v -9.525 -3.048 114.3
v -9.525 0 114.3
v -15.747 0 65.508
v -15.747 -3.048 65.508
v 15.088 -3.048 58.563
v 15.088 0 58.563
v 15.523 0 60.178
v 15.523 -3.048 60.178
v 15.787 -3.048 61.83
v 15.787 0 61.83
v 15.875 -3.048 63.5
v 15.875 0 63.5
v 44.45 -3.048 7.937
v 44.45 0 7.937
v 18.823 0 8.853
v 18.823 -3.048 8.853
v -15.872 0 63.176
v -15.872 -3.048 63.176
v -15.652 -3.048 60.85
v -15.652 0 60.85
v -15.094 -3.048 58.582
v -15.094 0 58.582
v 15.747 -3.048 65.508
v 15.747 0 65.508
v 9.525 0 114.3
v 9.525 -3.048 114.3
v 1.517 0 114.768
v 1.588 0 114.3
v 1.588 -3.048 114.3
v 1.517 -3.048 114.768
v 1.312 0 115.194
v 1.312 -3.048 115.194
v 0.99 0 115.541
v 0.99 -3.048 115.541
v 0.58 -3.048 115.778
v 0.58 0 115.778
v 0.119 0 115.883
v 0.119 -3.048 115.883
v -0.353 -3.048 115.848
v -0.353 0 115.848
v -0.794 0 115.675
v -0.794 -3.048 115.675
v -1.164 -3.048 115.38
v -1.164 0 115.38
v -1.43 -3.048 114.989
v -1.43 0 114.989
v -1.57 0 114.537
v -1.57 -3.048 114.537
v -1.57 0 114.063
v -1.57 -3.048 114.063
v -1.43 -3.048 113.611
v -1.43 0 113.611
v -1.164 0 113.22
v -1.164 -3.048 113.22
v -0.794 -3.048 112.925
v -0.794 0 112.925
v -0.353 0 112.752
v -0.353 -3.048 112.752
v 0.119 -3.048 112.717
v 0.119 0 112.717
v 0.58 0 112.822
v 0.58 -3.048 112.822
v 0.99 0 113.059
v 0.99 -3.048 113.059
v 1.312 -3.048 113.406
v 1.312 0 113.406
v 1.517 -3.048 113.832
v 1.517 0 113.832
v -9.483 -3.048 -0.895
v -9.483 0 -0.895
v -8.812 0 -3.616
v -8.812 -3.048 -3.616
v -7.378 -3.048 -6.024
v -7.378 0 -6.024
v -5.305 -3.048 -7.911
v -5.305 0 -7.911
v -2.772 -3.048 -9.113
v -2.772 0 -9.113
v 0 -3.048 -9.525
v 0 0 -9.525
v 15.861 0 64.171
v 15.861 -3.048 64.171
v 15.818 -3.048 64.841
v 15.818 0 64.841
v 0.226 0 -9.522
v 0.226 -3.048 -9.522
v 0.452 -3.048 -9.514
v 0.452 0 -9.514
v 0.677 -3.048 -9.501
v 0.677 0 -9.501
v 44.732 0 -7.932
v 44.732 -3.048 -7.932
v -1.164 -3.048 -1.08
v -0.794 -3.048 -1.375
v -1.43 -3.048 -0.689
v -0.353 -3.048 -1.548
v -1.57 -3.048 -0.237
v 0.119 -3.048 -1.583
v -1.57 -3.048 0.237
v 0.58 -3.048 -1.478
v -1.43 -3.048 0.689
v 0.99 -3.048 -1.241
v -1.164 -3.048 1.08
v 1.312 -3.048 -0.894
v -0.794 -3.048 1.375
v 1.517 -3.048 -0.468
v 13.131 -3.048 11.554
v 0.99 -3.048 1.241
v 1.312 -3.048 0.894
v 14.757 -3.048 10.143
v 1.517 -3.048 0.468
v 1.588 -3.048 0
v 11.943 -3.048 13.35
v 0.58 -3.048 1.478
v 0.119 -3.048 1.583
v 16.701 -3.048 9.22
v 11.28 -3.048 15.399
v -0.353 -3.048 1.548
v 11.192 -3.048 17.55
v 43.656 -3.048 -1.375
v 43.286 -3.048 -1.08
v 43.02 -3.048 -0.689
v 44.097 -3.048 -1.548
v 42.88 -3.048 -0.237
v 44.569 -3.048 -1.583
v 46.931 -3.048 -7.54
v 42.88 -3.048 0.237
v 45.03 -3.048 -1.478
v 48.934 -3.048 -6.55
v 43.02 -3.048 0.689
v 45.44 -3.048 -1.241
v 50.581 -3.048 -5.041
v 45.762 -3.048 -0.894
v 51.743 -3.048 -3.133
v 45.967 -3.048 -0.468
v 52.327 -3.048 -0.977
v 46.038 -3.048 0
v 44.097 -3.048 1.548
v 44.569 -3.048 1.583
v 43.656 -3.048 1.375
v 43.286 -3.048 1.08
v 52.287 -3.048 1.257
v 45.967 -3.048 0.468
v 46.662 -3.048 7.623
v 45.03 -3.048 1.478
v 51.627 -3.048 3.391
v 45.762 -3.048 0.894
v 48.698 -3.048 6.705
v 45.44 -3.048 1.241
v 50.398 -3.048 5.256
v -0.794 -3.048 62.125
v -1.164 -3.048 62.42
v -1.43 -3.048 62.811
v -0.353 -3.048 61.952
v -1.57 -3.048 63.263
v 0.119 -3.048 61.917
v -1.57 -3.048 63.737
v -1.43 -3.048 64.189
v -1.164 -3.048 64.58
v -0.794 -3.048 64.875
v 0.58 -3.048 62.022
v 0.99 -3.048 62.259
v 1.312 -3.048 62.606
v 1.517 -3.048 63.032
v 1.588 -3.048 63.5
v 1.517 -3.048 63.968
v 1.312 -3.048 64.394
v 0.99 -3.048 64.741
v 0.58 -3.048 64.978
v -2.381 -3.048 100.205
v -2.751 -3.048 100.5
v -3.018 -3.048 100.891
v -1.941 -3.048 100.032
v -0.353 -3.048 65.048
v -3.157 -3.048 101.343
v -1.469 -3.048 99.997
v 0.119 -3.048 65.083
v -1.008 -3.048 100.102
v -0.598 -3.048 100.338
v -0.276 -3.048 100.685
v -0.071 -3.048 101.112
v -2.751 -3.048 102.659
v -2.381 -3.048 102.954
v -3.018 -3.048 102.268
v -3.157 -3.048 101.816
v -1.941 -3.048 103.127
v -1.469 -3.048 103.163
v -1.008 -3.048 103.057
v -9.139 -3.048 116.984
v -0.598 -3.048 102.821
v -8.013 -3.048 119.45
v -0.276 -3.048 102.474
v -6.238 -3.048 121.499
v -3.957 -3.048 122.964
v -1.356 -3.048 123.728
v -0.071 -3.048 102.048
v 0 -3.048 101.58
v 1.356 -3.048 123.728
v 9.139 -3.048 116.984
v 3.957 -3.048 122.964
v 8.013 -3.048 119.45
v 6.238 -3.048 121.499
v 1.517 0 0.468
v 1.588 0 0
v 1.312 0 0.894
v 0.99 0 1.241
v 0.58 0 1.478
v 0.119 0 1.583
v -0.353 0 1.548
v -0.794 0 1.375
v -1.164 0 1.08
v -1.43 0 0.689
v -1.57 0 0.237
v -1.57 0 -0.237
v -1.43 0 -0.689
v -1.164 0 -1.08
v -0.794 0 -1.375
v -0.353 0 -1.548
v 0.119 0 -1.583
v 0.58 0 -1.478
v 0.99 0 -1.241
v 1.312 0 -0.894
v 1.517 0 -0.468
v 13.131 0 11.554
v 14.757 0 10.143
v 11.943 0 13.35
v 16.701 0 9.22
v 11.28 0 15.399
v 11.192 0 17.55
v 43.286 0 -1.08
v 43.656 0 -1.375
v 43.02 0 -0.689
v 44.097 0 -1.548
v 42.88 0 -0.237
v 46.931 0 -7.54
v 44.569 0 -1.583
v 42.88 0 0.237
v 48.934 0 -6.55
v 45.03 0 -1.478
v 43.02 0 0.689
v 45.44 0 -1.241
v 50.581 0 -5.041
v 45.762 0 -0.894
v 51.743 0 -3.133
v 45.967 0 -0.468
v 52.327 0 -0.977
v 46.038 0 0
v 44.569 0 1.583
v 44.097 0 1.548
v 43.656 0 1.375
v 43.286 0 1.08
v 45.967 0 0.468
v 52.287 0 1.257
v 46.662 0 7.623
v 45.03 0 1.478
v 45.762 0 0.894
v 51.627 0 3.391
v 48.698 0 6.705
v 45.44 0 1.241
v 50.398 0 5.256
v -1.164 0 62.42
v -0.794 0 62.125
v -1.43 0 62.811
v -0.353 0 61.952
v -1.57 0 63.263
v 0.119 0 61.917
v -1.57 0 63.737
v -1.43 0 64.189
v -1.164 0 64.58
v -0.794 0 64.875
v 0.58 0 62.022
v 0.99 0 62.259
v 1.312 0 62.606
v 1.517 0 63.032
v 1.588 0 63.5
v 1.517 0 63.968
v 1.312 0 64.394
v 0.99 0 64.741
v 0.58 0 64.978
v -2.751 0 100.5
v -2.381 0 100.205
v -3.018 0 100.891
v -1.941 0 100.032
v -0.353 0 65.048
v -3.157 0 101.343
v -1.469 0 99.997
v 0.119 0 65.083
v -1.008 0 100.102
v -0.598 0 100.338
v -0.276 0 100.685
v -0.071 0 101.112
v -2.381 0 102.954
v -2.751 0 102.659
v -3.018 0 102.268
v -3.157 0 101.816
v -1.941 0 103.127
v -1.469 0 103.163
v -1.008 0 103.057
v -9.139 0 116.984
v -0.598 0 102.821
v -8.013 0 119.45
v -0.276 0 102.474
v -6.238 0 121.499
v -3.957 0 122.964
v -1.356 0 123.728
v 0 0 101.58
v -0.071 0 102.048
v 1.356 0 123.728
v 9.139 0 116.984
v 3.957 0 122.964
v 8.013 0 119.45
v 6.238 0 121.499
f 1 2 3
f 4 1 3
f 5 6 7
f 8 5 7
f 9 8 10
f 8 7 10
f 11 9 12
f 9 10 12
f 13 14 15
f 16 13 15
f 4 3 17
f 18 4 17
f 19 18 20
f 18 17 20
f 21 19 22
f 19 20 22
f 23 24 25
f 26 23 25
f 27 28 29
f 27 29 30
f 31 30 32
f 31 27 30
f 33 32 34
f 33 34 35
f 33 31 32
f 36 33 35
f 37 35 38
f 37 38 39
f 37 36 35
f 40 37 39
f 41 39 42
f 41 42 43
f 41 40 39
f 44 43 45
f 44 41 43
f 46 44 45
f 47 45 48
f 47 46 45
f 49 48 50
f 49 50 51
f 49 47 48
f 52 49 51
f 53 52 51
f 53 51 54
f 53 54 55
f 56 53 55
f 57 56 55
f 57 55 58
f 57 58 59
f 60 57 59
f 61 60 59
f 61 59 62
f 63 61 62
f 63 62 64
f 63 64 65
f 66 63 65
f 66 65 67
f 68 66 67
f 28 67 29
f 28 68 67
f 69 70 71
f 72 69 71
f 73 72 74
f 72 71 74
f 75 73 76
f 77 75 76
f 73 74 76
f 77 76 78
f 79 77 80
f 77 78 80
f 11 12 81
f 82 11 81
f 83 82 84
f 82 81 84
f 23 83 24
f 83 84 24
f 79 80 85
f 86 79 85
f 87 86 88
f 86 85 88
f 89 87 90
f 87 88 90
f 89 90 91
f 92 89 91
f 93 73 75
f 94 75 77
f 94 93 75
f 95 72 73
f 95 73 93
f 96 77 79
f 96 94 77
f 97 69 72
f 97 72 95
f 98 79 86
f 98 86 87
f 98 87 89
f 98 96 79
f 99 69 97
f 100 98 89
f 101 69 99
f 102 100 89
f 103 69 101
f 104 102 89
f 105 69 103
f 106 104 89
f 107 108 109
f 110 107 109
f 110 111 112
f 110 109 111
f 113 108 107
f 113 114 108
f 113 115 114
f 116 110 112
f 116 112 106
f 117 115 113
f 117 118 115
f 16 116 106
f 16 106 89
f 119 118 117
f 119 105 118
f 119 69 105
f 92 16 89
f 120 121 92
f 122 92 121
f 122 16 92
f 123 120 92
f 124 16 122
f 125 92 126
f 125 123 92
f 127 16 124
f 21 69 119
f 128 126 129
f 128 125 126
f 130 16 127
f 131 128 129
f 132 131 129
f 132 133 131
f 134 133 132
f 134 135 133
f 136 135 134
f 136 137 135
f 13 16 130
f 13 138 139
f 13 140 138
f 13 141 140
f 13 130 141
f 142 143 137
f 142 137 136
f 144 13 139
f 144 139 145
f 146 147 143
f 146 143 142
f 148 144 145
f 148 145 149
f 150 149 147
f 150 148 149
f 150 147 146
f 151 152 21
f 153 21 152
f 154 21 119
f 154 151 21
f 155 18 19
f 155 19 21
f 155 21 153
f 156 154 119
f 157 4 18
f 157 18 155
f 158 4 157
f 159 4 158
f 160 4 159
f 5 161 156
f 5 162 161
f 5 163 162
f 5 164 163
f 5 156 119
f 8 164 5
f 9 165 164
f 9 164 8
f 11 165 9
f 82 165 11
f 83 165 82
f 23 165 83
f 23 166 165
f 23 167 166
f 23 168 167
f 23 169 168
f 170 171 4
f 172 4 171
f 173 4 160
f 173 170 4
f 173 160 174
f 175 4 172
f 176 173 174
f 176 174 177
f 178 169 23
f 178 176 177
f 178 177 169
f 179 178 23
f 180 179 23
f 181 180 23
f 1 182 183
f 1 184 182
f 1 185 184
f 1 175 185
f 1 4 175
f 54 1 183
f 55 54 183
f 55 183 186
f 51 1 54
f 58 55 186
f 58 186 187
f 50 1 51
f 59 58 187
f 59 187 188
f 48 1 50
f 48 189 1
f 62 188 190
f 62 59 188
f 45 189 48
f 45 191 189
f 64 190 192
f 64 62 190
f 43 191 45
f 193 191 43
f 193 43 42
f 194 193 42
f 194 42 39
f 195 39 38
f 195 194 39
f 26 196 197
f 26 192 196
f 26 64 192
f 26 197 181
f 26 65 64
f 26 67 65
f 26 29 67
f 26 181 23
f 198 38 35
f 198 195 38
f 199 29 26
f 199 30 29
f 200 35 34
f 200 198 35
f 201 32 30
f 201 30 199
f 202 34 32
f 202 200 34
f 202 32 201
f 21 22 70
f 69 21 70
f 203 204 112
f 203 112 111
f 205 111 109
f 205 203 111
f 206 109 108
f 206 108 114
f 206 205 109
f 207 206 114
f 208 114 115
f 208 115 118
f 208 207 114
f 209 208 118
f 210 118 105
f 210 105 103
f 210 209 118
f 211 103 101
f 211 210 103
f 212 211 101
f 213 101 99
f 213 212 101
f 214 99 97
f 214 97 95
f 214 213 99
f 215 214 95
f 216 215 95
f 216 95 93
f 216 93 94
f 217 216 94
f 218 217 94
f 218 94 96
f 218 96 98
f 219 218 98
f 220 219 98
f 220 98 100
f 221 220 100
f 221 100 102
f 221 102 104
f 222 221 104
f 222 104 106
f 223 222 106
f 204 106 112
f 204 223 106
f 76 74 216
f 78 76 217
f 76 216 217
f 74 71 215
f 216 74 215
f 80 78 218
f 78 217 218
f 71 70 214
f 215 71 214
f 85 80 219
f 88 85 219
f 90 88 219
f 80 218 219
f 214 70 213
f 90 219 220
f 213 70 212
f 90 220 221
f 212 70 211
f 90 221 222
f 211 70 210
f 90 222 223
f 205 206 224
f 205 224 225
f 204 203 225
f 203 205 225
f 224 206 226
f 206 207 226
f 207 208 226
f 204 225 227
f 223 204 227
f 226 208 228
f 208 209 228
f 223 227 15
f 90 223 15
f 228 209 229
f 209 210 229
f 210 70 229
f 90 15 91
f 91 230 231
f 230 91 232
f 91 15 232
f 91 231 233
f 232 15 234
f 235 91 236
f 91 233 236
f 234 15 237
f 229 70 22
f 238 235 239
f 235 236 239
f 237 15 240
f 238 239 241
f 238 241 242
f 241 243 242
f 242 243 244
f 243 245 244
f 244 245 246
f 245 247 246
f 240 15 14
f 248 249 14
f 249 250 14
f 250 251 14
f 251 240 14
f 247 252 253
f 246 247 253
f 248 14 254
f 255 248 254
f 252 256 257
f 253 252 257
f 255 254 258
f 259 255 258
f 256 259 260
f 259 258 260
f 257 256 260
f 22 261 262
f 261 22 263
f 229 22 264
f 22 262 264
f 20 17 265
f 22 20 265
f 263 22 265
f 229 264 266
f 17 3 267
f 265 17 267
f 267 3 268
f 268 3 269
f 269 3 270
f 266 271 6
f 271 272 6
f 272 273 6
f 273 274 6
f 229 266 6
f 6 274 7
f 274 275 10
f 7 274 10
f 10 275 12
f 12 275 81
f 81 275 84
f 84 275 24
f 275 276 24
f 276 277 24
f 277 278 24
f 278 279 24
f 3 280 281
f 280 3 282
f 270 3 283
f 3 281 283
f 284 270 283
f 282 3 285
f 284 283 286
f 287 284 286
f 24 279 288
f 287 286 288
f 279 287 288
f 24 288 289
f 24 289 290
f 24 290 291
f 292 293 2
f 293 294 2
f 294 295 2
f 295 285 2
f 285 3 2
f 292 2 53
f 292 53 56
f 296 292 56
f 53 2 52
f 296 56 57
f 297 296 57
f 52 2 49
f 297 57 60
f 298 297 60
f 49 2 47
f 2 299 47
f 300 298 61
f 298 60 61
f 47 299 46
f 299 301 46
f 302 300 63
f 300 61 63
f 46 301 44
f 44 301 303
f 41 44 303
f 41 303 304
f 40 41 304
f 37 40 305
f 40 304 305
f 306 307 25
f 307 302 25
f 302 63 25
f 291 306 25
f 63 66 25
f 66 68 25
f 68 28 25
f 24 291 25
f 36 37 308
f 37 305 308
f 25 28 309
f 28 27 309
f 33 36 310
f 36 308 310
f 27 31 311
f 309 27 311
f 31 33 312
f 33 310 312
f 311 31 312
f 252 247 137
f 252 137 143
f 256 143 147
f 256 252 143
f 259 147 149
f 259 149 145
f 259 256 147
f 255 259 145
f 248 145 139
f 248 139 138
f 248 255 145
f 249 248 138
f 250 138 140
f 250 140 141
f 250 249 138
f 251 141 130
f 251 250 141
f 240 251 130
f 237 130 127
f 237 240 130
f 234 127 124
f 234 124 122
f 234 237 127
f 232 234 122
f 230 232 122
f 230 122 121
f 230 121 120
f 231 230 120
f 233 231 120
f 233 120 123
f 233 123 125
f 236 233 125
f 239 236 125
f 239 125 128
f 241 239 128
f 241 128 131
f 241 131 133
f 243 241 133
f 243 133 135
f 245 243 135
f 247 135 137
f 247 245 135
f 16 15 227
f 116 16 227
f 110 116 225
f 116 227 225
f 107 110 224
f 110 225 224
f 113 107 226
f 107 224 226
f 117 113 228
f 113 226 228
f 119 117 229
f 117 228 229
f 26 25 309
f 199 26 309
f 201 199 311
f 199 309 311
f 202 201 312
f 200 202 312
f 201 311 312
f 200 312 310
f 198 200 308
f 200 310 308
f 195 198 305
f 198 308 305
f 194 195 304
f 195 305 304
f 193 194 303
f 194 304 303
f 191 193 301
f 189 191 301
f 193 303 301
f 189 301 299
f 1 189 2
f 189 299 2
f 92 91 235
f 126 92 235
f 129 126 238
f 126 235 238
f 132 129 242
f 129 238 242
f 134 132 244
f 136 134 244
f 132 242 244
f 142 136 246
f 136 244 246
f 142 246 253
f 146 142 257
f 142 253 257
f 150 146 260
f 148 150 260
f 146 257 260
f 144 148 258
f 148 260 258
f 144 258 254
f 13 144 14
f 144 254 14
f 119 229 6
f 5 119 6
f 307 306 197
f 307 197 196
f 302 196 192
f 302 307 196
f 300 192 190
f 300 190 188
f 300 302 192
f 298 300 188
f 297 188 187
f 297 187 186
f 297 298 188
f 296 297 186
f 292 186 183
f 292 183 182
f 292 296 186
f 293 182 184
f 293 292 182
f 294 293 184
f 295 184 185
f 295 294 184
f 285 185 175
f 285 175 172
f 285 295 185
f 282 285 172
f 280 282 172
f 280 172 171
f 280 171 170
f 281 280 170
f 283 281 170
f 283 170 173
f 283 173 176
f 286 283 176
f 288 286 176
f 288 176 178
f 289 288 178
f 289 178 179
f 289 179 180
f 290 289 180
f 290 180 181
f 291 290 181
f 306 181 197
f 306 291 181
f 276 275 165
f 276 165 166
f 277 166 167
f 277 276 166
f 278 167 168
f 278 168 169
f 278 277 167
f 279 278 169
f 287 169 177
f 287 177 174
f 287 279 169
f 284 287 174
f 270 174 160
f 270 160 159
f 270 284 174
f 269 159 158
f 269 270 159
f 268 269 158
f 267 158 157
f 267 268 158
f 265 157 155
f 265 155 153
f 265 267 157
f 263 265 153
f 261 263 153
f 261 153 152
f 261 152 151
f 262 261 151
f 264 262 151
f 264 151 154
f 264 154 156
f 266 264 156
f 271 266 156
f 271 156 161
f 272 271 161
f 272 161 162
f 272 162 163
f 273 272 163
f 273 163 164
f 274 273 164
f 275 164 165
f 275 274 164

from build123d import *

# Parameters (mm, degrees)
F0_R     = 1.5875
F1_DEPTH = 3.048


with BuildPart() as f1:
    # F0 (on Front) → F1 (new body)
    with BuildSketch(Plane.XZ):
        with BuildLine():
            ThreePointArc((44.7324052746, -7.9324746146), (50.1616327839, -5.5119104847), (52.3875, 0))
            ThreePointArc((52.3875, 0), (50.0626600757, 5.6126600757), (44.45, 7.9375))
            ThreePointArc((44.45, 7.9375), (36.5137564458, -0.1412249921), (44.7324052746, -7.9324746146))
        make_face()
        with Locations((44.45, 0)):
            Circle(F0_R, mode=Mode.SUBTRACT)
        with BuildLine():
            ThreePointArc((44.7324052746, -7.9324746146), (36.5137564458, -0.1412249921), (44.45, 7.9375))
            Line((44.45, 7.9375), (18.8228170321, 8.8527565346))
            ThreePointArc((18.8228170321, 8.8527565346), (13.130598856, 11.5544736108), (11.1919966494, 17.549675393))
            Line((11.1919966494, 17.549675393), (15.0877196672, 58.5627598555))
            ThreePointArc((15.0877196672, 58.5627598555), (-0.0101583242, 47.6250032501), (-15.0940259351, 58.5820729906))
            Line((-15.0940259351, 58.5820729906), (-9.4828929283, -0.8946321652))
            ThreePointArc((-9.4828929283, -0.8946321652), (-0.4478112651, 9.5144674087), (9.525, 0))
            ThreePointArc((9.525, 0), (6.9705567315, -6.4912990883), (0.6773435479, -9.500885786))
            Line((0.6773435479, -9.500885786), (44.7324052746, -7.9324746146))
        make_face()
        with BuildLine():
            Line((0, -9.525), (0.6773435479, -9.500885786))
            ThreePointArc((0.6773435479, -9.500885786), (6.9705567315, -6.4912990883), (9.525, 0))
            ThreePointArc((9.525, 0), (-0.4478112651, 9.5144674087), (-9.4828929283, -0.8946321652))
            ThreePointArc((-9.4828929283, -0.8946321652), (-6.4110940418, -7.0443948063), (0, -9.525))
        make_face()
        Circle(F0_R, mode=Mode.SUBTRACT)
        with BuildLine():
            ThreePointArc((0, -9.525), (0.3388863295, -9.5189695375), (0.6773435479, -9.500885786))
            Line((0.6773435479, -9.500885786), (0, -9.525))
        make_face()
        with BuildLine():
            Line((15.7474569047, 65.5082893304), (15.0877196672, 58.5627598555))
            ThreePointArc((15.0877196672, 58.5627598555), (15.6769444522, 61.0001924791), (15.875, 63.5))
            ThreePointArc((15.875, 63.5), (15.8430821396, 64.5061676396), (15.7474569047, 65.5082893304))
        make_face()
        with BuildLine():
            ThreePointArc((-15.0940259351, 58.5820729906), (-0.0101583242, 47.6250032501), (15.0877196672, 58.5627598555))
            Line((15.0877196672, 58.5627598555), (15.7474569047, 65.5082893304))
            ThreePointArc((15.7474569047, 65.5082893304), (0, 79.375), (-15.7474569047, 65.5082893304))
            Line((-15.7474569047, 65.5082893304), (-15.0940259351, 58.5820729906))
        make_face()
        with Locations((0, 63.5)):
            Circle(F0_R, mode=Mode.SUBTRACT)
        with BuildLine():
            ThreePointArc((-15.7474569047, 65.5082893304), (-15.8048215471, 62.0089463914), (-15.0940259351, 58.5820729906))
            Line((-15.0940259351, 58.5820729906), (-15.7474569047, 65.5082893304))
        make_face()
        with BuildLine():
            ThreePointArc((-15.7474569047, 65.5082893304), (0, 79.375), (15.7474569047, 65.5082893304))
            Line((15.7474569047, 65.5082893304), (9.525, 114.3))
            ThreePointArc((9.525, 114.3), (0, 104.775), (-9.525, 114.3))
            Line((-9.525, 114.3), (-15.7474569047, 65.5082893304))
        make_face()
        with Locations((-1.5875, 101.5796237513)):
            Circle(F0_R, mode=Mode.SUBTRACT)
        with BuildLine():
            ThreePointArc((-9.525, 114.3), (0, 104.775), (9.525, 114.3))
            ThreePointArc((9.525, 114.3), (0, 123.825), (-9.525, 114.3))
        make_face()
        with Locations((0, 114.3)):
            Circle(F0_R, mode=Mode.SUBTRACT)
    extrude(amount=F1_DEPTH)


solid = f1.part
